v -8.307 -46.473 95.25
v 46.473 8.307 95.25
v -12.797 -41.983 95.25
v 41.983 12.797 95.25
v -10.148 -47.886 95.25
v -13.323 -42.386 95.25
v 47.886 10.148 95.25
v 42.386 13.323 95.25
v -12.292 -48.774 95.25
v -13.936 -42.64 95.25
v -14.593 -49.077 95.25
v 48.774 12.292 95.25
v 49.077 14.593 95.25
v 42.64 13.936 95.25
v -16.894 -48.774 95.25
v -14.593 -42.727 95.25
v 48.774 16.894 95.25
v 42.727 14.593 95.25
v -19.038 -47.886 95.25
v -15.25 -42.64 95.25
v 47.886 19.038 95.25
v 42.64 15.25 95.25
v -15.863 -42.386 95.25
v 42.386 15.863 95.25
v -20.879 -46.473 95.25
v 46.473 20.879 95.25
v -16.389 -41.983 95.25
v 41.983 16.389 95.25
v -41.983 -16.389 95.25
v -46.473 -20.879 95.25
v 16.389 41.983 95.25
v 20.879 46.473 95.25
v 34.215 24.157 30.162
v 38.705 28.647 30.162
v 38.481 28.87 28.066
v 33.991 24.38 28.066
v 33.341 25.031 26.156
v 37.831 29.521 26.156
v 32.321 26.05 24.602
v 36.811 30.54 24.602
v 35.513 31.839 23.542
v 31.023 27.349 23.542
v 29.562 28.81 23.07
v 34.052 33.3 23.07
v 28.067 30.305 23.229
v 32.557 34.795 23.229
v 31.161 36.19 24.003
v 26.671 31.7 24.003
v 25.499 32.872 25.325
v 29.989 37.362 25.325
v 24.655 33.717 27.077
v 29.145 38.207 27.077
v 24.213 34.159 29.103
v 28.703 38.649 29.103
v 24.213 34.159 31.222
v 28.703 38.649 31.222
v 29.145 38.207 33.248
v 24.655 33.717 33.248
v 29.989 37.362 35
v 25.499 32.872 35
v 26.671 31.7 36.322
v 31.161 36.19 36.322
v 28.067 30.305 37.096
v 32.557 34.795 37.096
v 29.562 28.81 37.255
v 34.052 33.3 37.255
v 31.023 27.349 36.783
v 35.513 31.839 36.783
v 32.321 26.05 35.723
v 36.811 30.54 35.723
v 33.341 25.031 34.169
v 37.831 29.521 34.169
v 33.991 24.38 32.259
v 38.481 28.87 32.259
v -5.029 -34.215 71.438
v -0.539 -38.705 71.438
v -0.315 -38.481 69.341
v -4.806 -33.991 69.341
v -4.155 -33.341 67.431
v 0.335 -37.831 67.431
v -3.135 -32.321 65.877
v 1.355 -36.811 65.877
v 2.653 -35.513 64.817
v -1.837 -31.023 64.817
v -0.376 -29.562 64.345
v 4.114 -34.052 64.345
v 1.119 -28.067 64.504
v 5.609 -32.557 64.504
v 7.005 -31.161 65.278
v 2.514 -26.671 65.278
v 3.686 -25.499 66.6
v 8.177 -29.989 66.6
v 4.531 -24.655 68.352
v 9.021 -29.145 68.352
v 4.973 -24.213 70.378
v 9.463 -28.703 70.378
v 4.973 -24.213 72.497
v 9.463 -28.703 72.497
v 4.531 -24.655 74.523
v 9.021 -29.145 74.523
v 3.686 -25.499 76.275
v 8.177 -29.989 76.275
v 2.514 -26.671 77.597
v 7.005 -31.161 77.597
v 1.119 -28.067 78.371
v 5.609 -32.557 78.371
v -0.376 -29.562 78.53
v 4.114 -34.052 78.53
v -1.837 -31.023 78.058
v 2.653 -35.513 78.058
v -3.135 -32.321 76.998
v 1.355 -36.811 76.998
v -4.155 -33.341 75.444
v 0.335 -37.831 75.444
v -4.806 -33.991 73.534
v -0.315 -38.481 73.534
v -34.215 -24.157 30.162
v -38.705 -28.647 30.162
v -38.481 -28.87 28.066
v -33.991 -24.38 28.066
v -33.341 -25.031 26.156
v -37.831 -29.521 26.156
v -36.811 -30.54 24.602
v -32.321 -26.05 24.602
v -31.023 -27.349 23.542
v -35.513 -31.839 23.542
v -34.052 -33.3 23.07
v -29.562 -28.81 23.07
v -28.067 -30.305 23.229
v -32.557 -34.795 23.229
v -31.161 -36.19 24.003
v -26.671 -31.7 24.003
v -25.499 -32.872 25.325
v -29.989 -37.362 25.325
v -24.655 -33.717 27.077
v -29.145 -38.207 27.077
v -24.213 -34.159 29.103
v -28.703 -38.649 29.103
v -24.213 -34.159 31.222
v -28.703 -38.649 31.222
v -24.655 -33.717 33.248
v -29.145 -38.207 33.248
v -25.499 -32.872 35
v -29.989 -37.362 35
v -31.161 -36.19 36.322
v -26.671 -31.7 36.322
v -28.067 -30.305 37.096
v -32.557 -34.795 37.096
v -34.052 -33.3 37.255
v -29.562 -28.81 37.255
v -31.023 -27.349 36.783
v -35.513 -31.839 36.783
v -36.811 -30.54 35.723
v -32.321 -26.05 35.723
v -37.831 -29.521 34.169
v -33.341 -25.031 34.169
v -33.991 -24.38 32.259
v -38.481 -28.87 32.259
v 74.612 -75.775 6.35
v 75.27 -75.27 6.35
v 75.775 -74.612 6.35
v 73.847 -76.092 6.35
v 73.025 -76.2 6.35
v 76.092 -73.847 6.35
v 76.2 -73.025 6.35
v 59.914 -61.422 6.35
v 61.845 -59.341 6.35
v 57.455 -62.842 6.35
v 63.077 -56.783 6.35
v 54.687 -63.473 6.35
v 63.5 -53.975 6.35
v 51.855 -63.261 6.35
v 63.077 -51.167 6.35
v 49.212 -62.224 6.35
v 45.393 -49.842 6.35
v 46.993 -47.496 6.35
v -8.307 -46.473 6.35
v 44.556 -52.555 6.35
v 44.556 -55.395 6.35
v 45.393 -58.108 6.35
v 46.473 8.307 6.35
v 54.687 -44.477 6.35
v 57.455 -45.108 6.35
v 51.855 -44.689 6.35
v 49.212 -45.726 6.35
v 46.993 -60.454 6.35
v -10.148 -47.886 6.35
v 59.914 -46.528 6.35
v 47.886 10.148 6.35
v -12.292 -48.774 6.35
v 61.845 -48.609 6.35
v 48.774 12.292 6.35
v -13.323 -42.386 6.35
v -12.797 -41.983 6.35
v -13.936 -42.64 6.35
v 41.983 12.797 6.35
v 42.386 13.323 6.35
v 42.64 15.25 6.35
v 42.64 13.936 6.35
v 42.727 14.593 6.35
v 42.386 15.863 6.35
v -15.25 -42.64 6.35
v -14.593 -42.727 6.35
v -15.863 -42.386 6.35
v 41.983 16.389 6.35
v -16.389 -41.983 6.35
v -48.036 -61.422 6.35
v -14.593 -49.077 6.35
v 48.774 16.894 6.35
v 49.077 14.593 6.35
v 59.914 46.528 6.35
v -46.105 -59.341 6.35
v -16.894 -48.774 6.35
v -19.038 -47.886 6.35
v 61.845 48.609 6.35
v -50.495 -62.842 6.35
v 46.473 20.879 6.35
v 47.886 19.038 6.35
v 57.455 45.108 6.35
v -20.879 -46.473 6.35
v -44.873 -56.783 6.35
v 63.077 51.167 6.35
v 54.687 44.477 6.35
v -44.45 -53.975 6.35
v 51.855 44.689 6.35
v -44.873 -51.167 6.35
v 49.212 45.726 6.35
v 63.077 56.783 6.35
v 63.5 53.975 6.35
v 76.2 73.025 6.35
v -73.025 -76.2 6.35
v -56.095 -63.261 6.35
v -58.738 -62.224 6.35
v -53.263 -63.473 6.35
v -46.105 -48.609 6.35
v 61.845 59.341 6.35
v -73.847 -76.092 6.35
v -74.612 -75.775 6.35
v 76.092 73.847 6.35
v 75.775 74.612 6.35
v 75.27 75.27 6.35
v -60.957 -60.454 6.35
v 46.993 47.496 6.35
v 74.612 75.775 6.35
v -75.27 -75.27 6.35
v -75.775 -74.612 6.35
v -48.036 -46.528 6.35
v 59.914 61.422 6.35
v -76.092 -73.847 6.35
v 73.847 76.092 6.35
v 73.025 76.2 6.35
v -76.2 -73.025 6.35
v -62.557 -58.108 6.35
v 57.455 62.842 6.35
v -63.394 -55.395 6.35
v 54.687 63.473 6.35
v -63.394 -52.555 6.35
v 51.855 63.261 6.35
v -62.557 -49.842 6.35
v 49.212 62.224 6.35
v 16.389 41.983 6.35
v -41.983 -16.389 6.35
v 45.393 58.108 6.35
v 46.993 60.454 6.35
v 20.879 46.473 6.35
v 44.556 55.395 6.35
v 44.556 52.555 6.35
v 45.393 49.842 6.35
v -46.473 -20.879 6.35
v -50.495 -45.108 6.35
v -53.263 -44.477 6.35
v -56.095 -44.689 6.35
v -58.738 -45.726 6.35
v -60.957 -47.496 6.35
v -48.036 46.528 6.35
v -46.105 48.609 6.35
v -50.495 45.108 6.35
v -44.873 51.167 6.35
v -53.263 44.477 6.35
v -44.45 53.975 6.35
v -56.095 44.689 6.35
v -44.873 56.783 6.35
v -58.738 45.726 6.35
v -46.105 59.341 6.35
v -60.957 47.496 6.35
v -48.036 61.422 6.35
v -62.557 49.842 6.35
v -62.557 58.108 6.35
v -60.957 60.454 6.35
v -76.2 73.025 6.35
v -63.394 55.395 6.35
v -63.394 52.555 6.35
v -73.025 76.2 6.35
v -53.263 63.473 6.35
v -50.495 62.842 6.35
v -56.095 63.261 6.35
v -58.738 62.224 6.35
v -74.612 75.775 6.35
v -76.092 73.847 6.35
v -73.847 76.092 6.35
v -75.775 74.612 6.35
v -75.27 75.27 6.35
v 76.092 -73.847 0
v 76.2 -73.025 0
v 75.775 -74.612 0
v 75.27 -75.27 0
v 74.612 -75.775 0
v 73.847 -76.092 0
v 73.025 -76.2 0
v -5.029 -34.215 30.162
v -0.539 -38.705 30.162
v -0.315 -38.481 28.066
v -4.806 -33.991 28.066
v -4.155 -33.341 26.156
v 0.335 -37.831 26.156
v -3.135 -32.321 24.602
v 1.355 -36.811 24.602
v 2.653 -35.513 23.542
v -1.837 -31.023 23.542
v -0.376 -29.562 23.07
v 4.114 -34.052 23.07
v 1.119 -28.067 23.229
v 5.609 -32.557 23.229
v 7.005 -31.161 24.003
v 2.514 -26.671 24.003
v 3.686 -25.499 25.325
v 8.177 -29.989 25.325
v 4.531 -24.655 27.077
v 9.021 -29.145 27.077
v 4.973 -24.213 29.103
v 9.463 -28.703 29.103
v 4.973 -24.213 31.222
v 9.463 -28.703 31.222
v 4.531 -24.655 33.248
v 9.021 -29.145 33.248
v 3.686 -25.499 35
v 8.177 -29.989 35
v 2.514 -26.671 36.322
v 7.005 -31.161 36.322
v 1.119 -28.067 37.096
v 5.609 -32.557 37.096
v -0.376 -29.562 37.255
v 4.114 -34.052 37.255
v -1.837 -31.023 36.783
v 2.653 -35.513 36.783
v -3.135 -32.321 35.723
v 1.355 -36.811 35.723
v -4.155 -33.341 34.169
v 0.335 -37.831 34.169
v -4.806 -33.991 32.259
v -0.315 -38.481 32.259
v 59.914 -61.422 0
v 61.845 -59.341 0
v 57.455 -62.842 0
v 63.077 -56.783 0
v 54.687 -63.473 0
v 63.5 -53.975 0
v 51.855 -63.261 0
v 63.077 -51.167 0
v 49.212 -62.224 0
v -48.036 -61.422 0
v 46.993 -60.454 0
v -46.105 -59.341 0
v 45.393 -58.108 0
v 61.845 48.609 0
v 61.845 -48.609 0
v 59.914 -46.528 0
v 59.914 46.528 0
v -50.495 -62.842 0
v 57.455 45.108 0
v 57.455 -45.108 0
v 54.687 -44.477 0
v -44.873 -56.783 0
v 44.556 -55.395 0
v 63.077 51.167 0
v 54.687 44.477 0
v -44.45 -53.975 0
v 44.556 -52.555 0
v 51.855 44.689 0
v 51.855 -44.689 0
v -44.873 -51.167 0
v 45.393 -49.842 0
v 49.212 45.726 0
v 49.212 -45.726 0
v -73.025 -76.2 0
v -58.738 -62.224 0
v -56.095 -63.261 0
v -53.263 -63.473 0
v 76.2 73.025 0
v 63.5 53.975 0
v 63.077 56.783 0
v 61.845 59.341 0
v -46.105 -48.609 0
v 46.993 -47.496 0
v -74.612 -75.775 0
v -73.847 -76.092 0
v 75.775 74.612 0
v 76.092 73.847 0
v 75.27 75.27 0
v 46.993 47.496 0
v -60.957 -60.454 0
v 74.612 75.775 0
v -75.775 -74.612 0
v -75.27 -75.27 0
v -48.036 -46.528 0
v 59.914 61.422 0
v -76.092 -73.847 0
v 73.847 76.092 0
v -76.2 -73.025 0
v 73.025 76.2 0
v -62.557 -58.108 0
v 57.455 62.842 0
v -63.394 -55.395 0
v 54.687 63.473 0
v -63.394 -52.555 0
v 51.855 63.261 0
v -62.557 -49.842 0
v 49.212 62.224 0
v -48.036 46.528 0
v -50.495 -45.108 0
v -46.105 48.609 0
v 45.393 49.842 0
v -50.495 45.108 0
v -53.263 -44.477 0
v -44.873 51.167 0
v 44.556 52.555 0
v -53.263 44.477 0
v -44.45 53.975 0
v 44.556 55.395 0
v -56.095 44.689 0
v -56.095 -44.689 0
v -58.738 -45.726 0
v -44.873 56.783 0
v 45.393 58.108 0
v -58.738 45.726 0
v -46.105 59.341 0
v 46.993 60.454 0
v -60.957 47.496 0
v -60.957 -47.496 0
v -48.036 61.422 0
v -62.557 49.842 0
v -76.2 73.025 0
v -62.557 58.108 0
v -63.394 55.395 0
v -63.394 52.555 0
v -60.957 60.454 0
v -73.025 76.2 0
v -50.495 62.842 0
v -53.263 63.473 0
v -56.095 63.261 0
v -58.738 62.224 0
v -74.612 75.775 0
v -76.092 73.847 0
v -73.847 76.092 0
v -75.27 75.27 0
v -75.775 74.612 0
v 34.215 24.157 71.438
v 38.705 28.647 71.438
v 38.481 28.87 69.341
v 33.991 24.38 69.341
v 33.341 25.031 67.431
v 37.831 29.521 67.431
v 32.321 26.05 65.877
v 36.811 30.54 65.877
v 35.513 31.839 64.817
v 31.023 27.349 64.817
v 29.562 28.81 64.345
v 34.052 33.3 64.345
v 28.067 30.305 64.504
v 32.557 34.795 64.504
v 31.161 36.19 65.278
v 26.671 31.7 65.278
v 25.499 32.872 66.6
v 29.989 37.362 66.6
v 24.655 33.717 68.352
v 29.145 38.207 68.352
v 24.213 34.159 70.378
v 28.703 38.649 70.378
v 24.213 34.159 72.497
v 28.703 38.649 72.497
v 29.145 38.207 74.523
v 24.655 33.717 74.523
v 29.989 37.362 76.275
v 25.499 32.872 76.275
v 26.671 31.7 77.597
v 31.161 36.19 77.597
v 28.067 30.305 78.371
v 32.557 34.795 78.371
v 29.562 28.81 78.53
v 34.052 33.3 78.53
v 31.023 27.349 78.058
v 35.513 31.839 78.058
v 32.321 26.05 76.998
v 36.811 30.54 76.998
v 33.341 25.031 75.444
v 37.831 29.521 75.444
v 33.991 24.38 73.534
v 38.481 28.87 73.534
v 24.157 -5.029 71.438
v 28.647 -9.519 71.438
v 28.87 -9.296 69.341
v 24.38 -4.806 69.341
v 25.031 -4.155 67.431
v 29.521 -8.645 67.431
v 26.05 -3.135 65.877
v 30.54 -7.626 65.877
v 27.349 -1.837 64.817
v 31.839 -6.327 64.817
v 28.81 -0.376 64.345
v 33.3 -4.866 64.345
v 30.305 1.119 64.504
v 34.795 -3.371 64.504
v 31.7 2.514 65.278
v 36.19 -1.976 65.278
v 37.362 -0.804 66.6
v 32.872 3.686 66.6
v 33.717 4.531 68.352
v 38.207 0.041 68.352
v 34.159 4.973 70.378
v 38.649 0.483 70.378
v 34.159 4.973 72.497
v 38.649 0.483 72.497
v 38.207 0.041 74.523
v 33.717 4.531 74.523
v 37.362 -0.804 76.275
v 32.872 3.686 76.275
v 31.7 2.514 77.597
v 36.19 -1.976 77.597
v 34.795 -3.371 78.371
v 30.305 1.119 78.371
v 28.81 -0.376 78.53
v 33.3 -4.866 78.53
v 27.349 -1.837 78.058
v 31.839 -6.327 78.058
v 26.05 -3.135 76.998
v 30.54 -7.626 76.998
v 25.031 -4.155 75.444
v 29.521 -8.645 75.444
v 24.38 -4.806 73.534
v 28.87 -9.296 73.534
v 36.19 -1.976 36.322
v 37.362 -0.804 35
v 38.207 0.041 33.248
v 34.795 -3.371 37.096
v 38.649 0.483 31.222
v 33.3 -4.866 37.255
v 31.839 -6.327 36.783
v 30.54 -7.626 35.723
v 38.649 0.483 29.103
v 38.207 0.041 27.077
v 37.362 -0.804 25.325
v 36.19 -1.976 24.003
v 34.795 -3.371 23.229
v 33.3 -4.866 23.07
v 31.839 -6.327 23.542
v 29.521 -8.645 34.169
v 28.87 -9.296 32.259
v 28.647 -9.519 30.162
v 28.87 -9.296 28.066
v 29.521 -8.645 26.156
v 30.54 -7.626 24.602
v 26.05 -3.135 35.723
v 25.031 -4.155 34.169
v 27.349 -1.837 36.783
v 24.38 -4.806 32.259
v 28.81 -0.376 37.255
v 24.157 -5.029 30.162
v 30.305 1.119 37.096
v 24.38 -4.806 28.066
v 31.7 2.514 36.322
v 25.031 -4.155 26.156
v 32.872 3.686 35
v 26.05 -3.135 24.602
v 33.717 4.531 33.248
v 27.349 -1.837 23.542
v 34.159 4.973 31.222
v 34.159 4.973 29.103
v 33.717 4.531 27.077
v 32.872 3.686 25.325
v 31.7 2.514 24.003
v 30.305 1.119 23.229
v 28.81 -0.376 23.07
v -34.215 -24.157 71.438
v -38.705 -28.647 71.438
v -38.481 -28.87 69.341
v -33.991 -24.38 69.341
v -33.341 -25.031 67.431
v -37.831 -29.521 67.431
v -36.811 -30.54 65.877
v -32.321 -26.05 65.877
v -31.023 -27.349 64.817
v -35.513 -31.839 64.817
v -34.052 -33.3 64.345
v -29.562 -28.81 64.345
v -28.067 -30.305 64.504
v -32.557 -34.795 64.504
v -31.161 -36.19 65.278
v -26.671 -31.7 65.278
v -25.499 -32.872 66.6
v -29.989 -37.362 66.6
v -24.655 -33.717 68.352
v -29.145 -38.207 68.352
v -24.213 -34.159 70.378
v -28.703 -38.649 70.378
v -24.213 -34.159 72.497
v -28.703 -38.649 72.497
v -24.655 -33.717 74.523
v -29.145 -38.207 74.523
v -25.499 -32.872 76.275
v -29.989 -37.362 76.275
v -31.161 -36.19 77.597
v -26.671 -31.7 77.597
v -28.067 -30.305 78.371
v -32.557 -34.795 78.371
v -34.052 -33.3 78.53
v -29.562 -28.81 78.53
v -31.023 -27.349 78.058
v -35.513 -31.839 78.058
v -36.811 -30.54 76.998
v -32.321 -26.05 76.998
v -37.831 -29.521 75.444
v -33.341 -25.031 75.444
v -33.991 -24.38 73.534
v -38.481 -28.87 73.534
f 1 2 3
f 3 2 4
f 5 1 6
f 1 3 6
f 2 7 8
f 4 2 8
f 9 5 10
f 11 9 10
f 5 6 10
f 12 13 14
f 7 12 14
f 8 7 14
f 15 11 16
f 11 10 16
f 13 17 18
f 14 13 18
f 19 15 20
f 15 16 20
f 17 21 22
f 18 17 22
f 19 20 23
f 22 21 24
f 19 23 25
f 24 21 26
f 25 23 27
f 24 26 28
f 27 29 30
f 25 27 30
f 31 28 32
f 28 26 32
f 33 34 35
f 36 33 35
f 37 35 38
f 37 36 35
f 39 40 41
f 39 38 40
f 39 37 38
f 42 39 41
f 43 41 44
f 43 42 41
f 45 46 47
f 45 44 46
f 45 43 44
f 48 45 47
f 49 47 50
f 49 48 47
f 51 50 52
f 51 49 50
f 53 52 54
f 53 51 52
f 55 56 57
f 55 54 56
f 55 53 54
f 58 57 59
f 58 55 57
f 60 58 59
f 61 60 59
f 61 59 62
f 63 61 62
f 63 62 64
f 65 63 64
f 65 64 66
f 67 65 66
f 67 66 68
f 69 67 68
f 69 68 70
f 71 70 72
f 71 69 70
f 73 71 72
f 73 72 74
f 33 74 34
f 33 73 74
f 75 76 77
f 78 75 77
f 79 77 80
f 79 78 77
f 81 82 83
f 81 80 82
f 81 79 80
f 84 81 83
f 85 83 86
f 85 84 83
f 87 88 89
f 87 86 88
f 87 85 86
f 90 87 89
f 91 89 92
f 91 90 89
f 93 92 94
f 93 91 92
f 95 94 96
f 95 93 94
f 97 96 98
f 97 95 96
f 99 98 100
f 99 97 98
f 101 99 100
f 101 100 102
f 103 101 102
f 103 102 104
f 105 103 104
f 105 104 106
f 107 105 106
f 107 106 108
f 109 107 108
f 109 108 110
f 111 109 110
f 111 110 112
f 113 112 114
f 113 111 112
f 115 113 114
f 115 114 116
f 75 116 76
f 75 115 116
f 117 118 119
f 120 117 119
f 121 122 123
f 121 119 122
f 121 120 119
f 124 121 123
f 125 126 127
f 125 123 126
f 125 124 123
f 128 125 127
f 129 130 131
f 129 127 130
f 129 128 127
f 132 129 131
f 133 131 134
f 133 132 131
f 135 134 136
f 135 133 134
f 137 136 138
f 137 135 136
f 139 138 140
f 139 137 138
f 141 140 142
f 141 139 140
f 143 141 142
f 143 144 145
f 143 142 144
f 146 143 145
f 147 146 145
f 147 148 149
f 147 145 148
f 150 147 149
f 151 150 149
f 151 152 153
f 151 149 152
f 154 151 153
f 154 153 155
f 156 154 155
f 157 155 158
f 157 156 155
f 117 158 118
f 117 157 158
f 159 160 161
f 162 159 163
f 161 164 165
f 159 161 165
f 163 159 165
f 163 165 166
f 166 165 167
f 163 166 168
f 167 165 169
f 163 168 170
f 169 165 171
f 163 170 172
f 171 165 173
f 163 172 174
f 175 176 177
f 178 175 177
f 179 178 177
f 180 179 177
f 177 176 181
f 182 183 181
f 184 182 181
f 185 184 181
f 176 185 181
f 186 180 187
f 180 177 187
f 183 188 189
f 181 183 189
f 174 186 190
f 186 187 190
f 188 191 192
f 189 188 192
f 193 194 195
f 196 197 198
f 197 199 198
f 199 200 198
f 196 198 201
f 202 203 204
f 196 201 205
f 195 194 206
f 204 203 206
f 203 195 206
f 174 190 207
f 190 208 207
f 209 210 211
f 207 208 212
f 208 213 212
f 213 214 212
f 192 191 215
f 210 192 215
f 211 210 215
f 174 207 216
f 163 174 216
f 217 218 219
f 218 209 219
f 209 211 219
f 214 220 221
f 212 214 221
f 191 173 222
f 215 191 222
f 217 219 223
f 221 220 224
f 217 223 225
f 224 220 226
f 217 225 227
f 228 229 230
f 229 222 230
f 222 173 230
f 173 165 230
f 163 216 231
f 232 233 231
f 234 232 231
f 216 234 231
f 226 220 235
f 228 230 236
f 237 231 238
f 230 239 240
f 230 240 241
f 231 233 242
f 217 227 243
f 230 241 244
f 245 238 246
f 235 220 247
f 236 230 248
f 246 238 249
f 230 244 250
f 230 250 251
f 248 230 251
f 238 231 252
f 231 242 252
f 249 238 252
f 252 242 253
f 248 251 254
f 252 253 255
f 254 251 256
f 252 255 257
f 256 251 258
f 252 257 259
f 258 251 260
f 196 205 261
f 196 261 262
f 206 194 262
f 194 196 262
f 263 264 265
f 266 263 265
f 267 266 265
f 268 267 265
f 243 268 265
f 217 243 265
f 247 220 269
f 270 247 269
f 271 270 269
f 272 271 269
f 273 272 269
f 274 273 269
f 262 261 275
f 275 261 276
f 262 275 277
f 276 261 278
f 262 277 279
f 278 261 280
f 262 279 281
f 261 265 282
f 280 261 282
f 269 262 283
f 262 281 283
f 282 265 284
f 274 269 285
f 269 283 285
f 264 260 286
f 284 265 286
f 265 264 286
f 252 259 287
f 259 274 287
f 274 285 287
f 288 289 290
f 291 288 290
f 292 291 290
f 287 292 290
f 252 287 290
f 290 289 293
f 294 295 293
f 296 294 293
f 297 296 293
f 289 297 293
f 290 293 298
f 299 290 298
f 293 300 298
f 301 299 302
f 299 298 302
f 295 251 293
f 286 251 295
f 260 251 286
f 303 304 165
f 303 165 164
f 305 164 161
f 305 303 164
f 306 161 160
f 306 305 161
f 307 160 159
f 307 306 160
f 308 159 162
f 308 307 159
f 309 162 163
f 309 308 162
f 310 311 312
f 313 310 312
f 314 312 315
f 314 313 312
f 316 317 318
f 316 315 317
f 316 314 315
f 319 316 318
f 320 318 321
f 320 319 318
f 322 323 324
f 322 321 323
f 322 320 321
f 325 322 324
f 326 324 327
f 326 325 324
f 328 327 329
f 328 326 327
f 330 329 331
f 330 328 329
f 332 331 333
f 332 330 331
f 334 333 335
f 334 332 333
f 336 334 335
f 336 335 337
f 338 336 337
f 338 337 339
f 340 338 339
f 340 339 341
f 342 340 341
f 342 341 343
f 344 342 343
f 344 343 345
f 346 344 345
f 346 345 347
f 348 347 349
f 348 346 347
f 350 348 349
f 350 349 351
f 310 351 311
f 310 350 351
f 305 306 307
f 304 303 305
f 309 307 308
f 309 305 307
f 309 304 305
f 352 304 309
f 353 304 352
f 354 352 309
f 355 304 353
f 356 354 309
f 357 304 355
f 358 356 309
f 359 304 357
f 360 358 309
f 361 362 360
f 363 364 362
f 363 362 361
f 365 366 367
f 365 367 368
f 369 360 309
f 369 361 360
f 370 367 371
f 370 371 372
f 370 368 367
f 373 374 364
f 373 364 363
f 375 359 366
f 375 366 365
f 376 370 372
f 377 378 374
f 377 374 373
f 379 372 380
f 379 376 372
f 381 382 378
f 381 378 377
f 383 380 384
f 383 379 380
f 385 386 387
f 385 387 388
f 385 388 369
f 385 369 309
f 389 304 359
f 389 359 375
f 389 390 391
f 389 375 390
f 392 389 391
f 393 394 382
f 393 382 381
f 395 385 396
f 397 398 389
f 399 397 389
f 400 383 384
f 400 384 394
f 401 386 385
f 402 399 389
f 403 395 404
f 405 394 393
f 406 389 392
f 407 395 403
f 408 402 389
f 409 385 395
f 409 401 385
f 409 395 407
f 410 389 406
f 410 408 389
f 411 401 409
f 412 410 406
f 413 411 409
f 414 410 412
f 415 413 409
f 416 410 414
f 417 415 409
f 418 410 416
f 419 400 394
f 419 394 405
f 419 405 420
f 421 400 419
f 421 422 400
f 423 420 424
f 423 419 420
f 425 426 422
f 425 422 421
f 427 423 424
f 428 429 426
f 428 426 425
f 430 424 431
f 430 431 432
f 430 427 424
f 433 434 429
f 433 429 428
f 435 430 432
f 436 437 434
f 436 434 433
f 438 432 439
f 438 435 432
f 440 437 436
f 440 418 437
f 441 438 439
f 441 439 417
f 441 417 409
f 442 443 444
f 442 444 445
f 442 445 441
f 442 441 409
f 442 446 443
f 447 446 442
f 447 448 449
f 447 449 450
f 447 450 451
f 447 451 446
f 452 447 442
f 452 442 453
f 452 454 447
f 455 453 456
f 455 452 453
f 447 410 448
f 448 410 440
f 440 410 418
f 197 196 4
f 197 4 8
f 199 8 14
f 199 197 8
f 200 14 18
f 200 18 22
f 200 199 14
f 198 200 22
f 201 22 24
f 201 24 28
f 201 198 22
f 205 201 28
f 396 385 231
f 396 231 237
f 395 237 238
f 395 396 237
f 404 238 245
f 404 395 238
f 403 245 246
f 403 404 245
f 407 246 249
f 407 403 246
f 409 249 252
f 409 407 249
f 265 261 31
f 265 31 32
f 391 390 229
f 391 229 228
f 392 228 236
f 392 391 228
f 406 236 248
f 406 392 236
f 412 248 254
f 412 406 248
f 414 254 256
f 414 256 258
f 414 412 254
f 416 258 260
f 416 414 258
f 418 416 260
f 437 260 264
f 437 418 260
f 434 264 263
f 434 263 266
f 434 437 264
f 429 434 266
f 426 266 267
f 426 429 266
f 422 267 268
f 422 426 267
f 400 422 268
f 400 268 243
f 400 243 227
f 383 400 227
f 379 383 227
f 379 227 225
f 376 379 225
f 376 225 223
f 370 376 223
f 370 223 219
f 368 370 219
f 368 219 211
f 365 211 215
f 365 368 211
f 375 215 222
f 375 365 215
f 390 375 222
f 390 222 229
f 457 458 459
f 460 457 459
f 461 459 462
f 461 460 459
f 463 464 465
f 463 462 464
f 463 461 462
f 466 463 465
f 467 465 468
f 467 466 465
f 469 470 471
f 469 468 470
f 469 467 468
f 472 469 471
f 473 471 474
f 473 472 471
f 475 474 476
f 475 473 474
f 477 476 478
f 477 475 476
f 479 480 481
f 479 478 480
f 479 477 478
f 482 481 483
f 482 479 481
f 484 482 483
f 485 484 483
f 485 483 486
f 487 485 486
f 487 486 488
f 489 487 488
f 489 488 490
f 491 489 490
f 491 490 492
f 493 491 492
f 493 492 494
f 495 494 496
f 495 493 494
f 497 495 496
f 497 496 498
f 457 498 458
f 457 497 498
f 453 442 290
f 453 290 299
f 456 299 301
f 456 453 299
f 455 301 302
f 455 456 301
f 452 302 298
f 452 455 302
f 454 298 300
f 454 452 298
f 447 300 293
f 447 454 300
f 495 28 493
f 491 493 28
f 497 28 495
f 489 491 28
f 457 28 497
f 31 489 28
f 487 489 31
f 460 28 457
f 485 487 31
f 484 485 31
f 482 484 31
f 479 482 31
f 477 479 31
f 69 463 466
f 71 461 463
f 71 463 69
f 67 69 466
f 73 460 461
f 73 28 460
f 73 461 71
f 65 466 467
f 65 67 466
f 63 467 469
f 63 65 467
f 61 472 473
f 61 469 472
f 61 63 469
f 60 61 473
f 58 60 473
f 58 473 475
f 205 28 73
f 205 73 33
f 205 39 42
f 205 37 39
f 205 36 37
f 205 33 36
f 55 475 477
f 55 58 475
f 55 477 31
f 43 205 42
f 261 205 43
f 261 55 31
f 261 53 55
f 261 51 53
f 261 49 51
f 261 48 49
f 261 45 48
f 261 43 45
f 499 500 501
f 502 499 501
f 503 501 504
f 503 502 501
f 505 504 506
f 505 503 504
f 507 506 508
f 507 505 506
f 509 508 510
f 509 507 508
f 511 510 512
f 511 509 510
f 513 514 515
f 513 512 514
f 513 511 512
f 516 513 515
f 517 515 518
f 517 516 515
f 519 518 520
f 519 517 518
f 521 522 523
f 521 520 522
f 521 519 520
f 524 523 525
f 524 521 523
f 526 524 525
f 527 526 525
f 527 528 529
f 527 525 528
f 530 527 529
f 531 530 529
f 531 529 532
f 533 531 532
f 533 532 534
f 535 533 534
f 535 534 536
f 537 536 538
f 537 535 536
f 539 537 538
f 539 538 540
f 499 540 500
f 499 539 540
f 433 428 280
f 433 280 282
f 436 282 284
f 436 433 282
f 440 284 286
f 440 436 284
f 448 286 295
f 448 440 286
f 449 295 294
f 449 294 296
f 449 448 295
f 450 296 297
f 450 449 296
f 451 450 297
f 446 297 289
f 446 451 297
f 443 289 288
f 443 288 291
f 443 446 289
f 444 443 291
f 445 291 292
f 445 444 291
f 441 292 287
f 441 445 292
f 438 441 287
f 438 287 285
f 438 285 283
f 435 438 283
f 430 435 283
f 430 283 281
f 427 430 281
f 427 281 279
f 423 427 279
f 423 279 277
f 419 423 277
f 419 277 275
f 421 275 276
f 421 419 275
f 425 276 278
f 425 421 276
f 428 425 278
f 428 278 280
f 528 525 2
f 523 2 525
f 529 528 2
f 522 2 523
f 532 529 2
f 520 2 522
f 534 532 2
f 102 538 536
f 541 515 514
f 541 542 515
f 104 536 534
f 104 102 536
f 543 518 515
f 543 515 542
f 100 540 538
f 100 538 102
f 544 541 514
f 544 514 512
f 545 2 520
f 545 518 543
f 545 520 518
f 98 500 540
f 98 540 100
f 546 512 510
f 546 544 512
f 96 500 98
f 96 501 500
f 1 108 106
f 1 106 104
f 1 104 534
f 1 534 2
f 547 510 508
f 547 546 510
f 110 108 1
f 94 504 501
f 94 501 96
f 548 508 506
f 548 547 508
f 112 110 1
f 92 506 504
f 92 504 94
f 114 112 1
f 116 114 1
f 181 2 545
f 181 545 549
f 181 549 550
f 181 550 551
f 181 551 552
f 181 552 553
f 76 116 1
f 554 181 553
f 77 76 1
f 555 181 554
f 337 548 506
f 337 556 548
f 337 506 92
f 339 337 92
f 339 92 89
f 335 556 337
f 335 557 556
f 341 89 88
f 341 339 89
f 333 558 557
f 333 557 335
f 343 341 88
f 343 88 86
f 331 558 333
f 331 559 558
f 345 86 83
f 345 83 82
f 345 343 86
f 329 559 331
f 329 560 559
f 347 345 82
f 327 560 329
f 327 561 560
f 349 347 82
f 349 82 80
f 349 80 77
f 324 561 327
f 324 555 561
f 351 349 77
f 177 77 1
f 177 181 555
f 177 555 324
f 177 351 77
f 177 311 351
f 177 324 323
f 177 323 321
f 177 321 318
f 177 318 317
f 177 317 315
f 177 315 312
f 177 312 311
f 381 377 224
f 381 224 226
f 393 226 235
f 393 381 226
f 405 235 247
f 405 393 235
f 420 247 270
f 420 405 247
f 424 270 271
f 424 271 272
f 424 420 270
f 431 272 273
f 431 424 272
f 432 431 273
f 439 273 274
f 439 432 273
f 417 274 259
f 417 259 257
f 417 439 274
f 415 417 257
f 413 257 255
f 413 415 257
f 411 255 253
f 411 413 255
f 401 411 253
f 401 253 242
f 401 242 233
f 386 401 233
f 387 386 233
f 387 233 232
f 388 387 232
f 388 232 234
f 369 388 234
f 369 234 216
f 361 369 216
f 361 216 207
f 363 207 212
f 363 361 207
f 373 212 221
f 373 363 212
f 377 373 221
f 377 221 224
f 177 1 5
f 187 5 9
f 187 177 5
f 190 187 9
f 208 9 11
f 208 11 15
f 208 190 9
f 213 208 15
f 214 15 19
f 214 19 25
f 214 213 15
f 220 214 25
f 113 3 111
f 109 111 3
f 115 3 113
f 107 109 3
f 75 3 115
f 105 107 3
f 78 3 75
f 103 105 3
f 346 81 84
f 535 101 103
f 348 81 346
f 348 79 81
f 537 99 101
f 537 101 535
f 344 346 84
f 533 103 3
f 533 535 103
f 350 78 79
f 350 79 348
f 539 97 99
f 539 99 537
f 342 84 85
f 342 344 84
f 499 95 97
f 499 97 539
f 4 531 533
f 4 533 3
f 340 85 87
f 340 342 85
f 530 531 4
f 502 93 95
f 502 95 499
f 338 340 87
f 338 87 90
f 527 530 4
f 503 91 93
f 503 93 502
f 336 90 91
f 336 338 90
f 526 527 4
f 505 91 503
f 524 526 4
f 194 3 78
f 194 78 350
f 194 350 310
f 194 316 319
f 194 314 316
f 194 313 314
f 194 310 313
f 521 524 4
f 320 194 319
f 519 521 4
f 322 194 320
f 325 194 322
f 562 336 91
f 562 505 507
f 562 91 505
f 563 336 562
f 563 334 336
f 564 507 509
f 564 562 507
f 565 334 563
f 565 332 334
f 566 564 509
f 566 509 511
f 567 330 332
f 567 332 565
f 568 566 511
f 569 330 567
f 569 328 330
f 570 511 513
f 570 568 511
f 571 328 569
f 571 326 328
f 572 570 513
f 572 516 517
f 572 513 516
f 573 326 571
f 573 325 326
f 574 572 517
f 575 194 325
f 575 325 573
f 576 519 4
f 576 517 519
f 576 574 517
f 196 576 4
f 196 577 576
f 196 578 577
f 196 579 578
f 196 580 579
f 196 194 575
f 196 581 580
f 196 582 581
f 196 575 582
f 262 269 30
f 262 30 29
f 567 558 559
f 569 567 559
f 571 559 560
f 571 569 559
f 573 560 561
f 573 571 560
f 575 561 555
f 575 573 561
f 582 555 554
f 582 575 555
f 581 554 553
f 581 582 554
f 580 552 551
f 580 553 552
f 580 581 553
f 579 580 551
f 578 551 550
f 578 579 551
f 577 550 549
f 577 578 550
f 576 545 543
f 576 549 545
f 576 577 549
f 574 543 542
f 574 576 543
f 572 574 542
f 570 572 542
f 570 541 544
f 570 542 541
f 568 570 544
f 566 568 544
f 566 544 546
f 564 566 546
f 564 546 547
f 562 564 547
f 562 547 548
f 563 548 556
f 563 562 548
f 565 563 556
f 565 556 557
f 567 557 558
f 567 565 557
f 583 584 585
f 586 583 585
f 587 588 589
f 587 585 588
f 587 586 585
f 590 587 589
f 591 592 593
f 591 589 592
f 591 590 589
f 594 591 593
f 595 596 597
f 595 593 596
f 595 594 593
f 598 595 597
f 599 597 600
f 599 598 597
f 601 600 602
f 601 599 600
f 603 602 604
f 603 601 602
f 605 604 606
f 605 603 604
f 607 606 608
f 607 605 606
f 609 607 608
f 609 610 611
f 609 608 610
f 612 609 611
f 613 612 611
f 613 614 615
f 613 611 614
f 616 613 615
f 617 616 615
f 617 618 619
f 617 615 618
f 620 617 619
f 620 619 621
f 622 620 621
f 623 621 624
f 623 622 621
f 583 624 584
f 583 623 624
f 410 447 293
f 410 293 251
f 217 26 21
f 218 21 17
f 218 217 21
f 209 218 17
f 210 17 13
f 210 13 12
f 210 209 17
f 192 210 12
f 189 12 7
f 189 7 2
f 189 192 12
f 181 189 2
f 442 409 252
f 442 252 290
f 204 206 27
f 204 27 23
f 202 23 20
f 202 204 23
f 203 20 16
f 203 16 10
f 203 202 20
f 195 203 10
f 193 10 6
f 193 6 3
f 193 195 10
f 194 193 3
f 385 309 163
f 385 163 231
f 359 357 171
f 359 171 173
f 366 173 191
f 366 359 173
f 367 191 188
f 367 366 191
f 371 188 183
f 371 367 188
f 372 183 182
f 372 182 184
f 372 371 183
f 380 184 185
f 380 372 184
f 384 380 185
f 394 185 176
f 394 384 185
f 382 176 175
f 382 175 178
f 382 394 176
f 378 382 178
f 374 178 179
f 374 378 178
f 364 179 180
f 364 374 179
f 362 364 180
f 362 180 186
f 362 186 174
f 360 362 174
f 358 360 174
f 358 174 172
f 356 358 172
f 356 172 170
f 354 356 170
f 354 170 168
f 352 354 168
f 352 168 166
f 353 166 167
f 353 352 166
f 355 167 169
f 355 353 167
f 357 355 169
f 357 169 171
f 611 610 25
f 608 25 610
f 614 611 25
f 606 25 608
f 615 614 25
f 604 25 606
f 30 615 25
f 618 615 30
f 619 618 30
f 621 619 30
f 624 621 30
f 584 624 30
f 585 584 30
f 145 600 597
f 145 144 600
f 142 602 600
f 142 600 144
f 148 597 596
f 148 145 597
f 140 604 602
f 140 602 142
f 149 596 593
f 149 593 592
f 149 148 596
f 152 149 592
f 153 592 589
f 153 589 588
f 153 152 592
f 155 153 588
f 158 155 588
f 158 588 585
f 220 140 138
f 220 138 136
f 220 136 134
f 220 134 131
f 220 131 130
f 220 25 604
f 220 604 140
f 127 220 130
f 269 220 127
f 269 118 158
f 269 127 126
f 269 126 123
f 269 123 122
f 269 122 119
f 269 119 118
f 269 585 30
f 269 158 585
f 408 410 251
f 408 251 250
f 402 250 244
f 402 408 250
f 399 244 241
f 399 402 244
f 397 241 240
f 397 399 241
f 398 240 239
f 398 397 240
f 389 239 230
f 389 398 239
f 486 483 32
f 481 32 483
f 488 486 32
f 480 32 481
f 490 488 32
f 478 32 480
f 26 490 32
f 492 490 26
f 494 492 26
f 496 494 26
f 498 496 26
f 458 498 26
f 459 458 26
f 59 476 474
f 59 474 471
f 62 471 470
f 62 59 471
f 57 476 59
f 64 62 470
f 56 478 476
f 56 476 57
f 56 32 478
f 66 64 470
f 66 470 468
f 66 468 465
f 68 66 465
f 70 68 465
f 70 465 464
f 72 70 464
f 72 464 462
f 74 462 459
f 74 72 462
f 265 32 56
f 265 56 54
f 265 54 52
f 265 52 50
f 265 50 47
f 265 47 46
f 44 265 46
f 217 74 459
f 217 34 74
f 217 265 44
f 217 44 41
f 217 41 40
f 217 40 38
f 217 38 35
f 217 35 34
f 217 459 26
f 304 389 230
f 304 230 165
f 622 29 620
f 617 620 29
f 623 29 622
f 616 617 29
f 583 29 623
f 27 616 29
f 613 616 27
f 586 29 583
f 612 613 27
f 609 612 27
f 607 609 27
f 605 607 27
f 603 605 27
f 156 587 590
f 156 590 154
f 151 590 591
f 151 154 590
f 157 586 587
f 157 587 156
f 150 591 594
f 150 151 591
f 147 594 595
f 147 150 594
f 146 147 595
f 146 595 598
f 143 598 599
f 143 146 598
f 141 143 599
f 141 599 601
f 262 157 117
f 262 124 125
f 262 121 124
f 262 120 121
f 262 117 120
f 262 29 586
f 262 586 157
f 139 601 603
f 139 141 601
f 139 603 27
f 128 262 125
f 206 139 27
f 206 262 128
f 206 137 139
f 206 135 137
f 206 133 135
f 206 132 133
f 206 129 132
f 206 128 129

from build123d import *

# Parameters (mm, degrees)
SKETCH1_R           = 9.525
BOSS_EXTRUDE1_DEPTH = 6.35
EXTRUDE_THIN1_DEPTH = 88.9
SKETCH3_R           = 7.112
CUT_EXTRUDE1_DEPTH  = 144.824345992
CIRPATTERN1_COUNT   = 4


with BuildPart() as part:
    # Sketch1 → Boss-Extrude1 (new body)
    with BuildSketch(Plane.XY):
        with BuildLine():
            Line((-73.025, 76.2), (73.025, 76.2))
            ThreePointArc((73.025, 76.2), (75.27006403, 75.27006403), (76.2, 73.025))
            Line((76.2, 73.025), (76.2, -73.025))
            ThreePointArc((76.2, -73.025), (75.27006403, -75.27006403), (73.025, -76.2))
            Line((73.025, -76.2), (-73.025, -76.2))
            ThreePointArc((-73.025, -76.2), (-75.27006403, -75.27006403), (-76.2, -73.025))
            Line((-76.2, -73.025), (-76.2, 73.025))
            ThreePointArc((-76.2, 73.025), (-75.27006403, 75.27006403), (-73.025, 76.2))
        make_face()
        with Locations((-53.975, 53.975)):
            Circle(SKETCH1_R, mode=Mode.SUBTRACT)
        with Locations((-53.975, -53.975)):
            Circle(SKETCH1_R, mode=Mode.SUBTRACT)
        with Locations((53.975, 53.975)):
            Circle(SKETCH1_R, mode=Mode.SUBTRACT)
        with Locations((53.975, -53.975)):
            Circle(SKETCH1_R, mode=Mode.SUBTRACT)
    extrude(amount=BOSS_EXTRUDE1_DEPTH)

    # Sketch2 → Extrude-Thin1 (add)
    with BuildSketch(Plane.XY.offset(6.35)):
        with BuildLine():
            Line((-41.982697366, -16.388967421), (-16.388967421, -41.982697366))
            ThreePointArc((-16.388967421, -41.982697366), (-14.592916197, -42.726646142), (-12.796864973, -41.982697366))
            Line((-12.796864973, -41.982697366), (41.982697366, 12.796864973))
            ThreePointArc((41.982697366, 12.796864973), (42.726646142, 14.592916197), (41.982697366, 16.388967421))
            Line((41.982697366, 16.388967421), (16.388967421, 41.982697366))
            Line((16.388967421, 41.982697366), (20.879095481, 46.472825427))
            Line((20.879095481, 46.472825427), (46.472825427, 20.879095481))
            ThreePointArc((46.472825427, 20.879095481), (49.076646142, 14.592916197), (46.472825427, 8.306736912))
            Line((46.472825427, 8.306736912), (-8.306736912, -46.472825427))
            ThreePointArc((-8.306736912, -46.472825427), (-14.592916197, -49.076646142), (-20.879095481, -46.472825427))
            Line((-20.879095481, -46.472825427), (-46.472825427, -20.879095481))
            Line((-46.472825427, -20.879095481), (-41.982697366, -16.388967421))
        make_face()
    extrude(amount=EXTRUDE_THIN1_DEPTH)

    # Sketch3 → Cut-Extrude1 (cut, through all)
    with BuildSketch(Plane(origin=(0, 0, 0), x_dir=(-0.7071067811865511, -0.707106781186544, 0), z_dir=(0.707106781186544, -0.7071067811865511, 0))):
        with Locations((-20.6375, -30.1625)):
            Circle(SKETCH3_R)
        with Locations((-20.6375, -71.4375)):
            Circle(SKETCH3_R)
        with Locations((20.6375, -71.4375)):
            Circle(SKETCH3_R)
        with Locations((20.6375, -30.1625)):
            Circle(SKETCH3_R)
    cut_extrude1 = extrude(amount=CUT_EXTRUDE1_DEPTH, mode=Mode.SUBTRACT)

    # CirPattern1: Cut-Extrude1 ×4 about axis, 1 skipped
    cirpattern1_axis = Axis((14.592916197, 14.592916197, 71.4375), (0, 0, -1))
    add([cut_extrude1.rotate(cirpattern1_axis, i * 360 / CIRPATTERN1_COUNT) for i in range(1, CIRPATTERN1_COUNT) if i not in (2,)], mode=Mode.SUBTRACT)


solid = part.part
